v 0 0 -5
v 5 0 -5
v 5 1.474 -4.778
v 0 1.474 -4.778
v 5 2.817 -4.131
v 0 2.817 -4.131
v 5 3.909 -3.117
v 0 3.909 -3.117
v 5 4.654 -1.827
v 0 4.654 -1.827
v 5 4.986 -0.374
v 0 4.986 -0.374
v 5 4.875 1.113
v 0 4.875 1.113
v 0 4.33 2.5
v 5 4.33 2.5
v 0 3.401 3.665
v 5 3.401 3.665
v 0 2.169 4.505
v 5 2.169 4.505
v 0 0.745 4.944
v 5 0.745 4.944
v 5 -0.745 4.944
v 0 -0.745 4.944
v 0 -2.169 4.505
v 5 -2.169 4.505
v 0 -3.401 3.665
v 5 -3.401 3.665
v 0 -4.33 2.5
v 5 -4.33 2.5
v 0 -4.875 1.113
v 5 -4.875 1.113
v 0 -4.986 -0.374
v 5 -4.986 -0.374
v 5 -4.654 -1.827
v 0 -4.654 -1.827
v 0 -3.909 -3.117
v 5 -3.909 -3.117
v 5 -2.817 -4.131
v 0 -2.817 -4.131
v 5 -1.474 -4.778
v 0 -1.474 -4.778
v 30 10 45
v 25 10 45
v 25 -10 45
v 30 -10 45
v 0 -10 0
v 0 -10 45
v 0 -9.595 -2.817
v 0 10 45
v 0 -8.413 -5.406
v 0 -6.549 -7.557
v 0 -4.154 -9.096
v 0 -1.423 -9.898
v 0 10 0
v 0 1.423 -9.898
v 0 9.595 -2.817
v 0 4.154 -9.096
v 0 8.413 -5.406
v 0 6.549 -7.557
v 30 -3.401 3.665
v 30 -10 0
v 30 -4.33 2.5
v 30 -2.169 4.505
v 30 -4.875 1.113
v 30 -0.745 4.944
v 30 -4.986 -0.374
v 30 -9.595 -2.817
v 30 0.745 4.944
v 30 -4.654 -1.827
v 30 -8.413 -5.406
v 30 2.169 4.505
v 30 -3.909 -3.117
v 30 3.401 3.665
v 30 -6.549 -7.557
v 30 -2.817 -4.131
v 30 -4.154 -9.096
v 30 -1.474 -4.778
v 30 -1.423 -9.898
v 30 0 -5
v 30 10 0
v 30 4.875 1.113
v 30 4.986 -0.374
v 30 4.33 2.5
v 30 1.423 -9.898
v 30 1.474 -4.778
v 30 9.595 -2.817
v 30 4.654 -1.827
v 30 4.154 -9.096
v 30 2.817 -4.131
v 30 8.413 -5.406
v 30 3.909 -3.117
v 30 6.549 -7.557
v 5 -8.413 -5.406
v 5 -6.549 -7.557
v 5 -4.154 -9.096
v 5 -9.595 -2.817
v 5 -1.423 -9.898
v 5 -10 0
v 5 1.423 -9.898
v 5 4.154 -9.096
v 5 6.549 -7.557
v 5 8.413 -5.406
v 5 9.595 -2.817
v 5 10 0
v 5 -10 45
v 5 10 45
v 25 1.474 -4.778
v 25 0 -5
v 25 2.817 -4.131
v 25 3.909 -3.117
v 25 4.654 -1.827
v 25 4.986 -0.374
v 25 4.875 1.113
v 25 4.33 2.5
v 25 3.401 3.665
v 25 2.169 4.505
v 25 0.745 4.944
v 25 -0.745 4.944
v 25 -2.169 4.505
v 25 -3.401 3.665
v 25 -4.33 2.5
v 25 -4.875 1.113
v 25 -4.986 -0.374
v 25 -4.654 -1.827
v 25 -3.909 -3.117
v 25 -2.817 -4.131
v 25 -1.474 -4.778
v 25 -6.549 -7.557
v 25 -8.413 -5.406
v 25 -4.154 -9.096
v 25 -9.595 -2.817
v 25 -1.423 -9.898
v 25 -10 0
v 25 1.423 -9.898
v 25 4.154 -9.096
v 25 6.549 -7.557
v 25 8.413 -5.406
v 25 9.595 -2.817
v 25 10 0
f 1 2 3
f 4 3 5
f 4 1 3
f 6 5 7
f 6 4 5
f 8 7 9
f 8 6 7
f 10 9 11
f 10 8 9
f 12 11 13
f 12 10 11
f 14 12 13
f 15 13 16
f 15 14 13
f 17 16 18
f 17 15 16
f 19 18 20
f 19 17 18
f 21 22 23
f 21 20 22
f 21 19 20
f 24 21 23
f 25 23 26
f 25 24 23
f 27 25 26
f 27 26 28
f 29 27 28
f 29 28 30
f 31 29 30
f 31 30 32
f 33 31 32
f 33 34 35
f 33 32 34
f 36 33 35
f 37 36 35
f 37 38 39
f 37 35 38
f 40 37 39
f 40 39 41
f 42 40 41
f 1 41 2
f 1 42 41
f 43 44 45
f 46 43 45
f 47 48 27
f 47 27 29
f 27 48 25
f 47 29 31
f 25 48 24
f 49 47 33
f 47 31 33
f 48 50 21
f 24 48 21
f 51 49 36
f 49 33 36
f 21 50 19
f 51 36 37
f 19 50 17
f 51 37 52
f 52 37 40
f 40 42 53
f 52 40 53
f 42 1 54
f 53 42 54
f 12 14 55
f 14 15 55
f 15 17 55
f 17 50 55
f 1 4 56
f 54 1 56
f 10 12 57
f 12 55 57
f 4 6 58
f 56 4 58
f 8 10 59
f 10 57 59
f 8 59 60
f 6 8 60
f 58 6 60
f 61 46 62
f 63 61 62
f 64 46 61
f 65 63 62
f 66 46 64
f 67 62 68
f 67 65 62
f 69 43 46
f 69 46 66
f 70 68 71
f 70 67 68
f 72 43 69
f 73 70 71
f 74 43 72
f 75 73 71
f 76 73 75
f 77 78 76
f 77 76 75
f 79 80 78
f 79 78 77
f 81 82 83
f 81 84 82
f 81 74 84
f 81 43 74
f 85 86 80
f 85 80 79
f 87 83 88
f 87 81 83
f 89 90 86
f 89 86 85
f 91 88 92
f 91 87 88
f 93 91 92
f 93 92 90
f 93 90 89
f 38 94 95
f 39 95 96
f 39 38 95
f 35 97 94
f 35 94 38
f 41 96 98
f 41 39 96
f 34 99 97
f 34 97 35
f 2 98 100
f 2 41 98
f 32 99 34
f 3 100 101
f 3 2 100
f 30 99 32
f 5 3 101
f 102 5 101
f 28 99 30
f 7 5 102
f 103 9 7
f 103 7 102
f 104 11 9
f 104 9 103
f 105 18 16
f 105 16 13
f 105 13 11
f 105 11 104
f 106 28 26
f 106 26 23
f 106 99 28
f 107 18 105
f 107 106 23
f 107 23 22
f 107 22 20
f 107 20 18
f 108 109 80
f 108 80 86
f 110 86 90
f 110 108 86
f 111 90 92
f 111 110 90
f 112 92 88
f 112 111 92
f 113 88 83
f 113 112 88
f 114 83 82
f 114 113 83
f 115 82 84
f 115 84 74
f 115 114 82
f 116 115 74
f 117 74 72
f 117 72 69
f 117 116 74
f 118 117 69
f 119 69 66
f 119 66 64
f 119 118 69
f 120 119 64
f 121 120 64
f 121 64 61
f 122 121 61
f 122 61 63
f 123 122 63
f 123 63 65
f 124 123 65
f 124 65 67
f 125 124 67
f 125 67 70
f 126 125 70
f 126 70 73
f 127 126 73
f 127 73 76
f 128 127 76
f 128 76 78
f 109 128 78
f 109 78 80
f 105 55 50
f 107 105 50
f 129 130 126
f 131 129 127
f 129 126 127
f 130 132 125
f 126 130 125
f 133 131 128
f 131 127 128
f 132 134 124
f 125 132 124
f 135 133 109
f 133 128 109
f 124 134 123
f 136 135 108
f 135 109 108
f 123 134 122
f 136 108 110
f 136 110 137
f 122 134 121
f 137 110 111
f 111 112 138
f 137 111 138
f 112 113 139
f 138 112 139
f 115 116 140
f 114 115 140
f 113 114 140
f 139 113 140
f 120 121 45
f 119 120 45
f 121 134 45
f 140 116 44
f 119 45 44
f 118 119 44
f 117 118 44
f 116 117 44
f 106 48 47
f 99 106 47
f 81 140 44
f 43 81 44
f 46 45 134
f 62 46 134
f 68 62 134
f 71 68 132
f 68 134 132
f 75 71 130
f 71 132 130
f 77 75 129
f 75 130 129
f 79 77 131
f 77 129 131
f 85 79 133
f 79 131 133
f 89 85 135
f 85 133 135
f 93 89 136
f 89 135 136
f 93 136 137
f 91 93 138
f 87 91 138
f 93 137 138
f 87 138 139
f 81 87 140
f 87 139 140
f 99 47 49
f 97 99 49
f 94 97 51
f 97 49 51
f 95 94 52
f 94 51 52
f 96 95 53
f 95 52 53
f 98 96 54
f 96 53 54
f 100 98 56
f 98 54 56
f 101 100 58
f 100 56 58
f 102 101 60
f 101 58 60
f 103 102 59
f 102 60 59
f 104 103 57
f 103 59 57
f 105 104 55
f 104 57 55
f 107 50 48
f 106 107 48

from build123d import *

# Parameters (mm, degrees)
SKETCH1_R           = 5
BOSS_EXTRUDE1_DEPTH = 30
SKETCH2_W           = 20
SKETCH2_H           = 20
CUT_EXTRUDE1_DEPTH  = 65


with BuildPart() as part:
    # Sketch1 → Boss-Extrude1 (new body)
    with BuildSketch(Plane(origin=(0, 0, 0), x_dir=(0, 0, -1), z_dir=(1, 0, 0))):
        with BuildLine():
            Line((0, 10), (-45, 10))
            Line((-45, 10), (-45, -10))
            Line((-45, -10), (0, -10))
            ThreePointArc((0, -10), (10, 0), (0, 10))
        make_face()
        Circle(SKETCH1_R, mode=Mode.SUBTRACT)
    extrude(amount=BOSS_EXTRUDE1_DEPTH)

    # Sketch2 → Cut-Extrude1 (cut)
    with BuildSketch(Plane.XY.offset(45)):
        with Locations((15, 0)):
            Rectangle(SKETCH2_W, SKETCH2_H)
    extrude(amount=-CUT_EXTRUDE1_DEPTH, mode=Mode.SUBTRACT)


with BuildPart() as cut_extrude1_piece_1:
    # of the separate pieces the step leaves, piece 1, a body of its own (cut_extrude1_pieces)
    add(part.part.solids().sort_by_distance((25, 10, 45))[0])


with BuildPart() as cut_extrude1_piece_2:
    # of the separate pieces the step leaves, piece 2, a body of its own (cut_extrude1_pieces)
    add(part.part.solids().sort_by_distance((0, 10, 0))[0])


solid = Compound([cut_extrude1_piece_1.part, cut_extrude1_piece_2.part])
